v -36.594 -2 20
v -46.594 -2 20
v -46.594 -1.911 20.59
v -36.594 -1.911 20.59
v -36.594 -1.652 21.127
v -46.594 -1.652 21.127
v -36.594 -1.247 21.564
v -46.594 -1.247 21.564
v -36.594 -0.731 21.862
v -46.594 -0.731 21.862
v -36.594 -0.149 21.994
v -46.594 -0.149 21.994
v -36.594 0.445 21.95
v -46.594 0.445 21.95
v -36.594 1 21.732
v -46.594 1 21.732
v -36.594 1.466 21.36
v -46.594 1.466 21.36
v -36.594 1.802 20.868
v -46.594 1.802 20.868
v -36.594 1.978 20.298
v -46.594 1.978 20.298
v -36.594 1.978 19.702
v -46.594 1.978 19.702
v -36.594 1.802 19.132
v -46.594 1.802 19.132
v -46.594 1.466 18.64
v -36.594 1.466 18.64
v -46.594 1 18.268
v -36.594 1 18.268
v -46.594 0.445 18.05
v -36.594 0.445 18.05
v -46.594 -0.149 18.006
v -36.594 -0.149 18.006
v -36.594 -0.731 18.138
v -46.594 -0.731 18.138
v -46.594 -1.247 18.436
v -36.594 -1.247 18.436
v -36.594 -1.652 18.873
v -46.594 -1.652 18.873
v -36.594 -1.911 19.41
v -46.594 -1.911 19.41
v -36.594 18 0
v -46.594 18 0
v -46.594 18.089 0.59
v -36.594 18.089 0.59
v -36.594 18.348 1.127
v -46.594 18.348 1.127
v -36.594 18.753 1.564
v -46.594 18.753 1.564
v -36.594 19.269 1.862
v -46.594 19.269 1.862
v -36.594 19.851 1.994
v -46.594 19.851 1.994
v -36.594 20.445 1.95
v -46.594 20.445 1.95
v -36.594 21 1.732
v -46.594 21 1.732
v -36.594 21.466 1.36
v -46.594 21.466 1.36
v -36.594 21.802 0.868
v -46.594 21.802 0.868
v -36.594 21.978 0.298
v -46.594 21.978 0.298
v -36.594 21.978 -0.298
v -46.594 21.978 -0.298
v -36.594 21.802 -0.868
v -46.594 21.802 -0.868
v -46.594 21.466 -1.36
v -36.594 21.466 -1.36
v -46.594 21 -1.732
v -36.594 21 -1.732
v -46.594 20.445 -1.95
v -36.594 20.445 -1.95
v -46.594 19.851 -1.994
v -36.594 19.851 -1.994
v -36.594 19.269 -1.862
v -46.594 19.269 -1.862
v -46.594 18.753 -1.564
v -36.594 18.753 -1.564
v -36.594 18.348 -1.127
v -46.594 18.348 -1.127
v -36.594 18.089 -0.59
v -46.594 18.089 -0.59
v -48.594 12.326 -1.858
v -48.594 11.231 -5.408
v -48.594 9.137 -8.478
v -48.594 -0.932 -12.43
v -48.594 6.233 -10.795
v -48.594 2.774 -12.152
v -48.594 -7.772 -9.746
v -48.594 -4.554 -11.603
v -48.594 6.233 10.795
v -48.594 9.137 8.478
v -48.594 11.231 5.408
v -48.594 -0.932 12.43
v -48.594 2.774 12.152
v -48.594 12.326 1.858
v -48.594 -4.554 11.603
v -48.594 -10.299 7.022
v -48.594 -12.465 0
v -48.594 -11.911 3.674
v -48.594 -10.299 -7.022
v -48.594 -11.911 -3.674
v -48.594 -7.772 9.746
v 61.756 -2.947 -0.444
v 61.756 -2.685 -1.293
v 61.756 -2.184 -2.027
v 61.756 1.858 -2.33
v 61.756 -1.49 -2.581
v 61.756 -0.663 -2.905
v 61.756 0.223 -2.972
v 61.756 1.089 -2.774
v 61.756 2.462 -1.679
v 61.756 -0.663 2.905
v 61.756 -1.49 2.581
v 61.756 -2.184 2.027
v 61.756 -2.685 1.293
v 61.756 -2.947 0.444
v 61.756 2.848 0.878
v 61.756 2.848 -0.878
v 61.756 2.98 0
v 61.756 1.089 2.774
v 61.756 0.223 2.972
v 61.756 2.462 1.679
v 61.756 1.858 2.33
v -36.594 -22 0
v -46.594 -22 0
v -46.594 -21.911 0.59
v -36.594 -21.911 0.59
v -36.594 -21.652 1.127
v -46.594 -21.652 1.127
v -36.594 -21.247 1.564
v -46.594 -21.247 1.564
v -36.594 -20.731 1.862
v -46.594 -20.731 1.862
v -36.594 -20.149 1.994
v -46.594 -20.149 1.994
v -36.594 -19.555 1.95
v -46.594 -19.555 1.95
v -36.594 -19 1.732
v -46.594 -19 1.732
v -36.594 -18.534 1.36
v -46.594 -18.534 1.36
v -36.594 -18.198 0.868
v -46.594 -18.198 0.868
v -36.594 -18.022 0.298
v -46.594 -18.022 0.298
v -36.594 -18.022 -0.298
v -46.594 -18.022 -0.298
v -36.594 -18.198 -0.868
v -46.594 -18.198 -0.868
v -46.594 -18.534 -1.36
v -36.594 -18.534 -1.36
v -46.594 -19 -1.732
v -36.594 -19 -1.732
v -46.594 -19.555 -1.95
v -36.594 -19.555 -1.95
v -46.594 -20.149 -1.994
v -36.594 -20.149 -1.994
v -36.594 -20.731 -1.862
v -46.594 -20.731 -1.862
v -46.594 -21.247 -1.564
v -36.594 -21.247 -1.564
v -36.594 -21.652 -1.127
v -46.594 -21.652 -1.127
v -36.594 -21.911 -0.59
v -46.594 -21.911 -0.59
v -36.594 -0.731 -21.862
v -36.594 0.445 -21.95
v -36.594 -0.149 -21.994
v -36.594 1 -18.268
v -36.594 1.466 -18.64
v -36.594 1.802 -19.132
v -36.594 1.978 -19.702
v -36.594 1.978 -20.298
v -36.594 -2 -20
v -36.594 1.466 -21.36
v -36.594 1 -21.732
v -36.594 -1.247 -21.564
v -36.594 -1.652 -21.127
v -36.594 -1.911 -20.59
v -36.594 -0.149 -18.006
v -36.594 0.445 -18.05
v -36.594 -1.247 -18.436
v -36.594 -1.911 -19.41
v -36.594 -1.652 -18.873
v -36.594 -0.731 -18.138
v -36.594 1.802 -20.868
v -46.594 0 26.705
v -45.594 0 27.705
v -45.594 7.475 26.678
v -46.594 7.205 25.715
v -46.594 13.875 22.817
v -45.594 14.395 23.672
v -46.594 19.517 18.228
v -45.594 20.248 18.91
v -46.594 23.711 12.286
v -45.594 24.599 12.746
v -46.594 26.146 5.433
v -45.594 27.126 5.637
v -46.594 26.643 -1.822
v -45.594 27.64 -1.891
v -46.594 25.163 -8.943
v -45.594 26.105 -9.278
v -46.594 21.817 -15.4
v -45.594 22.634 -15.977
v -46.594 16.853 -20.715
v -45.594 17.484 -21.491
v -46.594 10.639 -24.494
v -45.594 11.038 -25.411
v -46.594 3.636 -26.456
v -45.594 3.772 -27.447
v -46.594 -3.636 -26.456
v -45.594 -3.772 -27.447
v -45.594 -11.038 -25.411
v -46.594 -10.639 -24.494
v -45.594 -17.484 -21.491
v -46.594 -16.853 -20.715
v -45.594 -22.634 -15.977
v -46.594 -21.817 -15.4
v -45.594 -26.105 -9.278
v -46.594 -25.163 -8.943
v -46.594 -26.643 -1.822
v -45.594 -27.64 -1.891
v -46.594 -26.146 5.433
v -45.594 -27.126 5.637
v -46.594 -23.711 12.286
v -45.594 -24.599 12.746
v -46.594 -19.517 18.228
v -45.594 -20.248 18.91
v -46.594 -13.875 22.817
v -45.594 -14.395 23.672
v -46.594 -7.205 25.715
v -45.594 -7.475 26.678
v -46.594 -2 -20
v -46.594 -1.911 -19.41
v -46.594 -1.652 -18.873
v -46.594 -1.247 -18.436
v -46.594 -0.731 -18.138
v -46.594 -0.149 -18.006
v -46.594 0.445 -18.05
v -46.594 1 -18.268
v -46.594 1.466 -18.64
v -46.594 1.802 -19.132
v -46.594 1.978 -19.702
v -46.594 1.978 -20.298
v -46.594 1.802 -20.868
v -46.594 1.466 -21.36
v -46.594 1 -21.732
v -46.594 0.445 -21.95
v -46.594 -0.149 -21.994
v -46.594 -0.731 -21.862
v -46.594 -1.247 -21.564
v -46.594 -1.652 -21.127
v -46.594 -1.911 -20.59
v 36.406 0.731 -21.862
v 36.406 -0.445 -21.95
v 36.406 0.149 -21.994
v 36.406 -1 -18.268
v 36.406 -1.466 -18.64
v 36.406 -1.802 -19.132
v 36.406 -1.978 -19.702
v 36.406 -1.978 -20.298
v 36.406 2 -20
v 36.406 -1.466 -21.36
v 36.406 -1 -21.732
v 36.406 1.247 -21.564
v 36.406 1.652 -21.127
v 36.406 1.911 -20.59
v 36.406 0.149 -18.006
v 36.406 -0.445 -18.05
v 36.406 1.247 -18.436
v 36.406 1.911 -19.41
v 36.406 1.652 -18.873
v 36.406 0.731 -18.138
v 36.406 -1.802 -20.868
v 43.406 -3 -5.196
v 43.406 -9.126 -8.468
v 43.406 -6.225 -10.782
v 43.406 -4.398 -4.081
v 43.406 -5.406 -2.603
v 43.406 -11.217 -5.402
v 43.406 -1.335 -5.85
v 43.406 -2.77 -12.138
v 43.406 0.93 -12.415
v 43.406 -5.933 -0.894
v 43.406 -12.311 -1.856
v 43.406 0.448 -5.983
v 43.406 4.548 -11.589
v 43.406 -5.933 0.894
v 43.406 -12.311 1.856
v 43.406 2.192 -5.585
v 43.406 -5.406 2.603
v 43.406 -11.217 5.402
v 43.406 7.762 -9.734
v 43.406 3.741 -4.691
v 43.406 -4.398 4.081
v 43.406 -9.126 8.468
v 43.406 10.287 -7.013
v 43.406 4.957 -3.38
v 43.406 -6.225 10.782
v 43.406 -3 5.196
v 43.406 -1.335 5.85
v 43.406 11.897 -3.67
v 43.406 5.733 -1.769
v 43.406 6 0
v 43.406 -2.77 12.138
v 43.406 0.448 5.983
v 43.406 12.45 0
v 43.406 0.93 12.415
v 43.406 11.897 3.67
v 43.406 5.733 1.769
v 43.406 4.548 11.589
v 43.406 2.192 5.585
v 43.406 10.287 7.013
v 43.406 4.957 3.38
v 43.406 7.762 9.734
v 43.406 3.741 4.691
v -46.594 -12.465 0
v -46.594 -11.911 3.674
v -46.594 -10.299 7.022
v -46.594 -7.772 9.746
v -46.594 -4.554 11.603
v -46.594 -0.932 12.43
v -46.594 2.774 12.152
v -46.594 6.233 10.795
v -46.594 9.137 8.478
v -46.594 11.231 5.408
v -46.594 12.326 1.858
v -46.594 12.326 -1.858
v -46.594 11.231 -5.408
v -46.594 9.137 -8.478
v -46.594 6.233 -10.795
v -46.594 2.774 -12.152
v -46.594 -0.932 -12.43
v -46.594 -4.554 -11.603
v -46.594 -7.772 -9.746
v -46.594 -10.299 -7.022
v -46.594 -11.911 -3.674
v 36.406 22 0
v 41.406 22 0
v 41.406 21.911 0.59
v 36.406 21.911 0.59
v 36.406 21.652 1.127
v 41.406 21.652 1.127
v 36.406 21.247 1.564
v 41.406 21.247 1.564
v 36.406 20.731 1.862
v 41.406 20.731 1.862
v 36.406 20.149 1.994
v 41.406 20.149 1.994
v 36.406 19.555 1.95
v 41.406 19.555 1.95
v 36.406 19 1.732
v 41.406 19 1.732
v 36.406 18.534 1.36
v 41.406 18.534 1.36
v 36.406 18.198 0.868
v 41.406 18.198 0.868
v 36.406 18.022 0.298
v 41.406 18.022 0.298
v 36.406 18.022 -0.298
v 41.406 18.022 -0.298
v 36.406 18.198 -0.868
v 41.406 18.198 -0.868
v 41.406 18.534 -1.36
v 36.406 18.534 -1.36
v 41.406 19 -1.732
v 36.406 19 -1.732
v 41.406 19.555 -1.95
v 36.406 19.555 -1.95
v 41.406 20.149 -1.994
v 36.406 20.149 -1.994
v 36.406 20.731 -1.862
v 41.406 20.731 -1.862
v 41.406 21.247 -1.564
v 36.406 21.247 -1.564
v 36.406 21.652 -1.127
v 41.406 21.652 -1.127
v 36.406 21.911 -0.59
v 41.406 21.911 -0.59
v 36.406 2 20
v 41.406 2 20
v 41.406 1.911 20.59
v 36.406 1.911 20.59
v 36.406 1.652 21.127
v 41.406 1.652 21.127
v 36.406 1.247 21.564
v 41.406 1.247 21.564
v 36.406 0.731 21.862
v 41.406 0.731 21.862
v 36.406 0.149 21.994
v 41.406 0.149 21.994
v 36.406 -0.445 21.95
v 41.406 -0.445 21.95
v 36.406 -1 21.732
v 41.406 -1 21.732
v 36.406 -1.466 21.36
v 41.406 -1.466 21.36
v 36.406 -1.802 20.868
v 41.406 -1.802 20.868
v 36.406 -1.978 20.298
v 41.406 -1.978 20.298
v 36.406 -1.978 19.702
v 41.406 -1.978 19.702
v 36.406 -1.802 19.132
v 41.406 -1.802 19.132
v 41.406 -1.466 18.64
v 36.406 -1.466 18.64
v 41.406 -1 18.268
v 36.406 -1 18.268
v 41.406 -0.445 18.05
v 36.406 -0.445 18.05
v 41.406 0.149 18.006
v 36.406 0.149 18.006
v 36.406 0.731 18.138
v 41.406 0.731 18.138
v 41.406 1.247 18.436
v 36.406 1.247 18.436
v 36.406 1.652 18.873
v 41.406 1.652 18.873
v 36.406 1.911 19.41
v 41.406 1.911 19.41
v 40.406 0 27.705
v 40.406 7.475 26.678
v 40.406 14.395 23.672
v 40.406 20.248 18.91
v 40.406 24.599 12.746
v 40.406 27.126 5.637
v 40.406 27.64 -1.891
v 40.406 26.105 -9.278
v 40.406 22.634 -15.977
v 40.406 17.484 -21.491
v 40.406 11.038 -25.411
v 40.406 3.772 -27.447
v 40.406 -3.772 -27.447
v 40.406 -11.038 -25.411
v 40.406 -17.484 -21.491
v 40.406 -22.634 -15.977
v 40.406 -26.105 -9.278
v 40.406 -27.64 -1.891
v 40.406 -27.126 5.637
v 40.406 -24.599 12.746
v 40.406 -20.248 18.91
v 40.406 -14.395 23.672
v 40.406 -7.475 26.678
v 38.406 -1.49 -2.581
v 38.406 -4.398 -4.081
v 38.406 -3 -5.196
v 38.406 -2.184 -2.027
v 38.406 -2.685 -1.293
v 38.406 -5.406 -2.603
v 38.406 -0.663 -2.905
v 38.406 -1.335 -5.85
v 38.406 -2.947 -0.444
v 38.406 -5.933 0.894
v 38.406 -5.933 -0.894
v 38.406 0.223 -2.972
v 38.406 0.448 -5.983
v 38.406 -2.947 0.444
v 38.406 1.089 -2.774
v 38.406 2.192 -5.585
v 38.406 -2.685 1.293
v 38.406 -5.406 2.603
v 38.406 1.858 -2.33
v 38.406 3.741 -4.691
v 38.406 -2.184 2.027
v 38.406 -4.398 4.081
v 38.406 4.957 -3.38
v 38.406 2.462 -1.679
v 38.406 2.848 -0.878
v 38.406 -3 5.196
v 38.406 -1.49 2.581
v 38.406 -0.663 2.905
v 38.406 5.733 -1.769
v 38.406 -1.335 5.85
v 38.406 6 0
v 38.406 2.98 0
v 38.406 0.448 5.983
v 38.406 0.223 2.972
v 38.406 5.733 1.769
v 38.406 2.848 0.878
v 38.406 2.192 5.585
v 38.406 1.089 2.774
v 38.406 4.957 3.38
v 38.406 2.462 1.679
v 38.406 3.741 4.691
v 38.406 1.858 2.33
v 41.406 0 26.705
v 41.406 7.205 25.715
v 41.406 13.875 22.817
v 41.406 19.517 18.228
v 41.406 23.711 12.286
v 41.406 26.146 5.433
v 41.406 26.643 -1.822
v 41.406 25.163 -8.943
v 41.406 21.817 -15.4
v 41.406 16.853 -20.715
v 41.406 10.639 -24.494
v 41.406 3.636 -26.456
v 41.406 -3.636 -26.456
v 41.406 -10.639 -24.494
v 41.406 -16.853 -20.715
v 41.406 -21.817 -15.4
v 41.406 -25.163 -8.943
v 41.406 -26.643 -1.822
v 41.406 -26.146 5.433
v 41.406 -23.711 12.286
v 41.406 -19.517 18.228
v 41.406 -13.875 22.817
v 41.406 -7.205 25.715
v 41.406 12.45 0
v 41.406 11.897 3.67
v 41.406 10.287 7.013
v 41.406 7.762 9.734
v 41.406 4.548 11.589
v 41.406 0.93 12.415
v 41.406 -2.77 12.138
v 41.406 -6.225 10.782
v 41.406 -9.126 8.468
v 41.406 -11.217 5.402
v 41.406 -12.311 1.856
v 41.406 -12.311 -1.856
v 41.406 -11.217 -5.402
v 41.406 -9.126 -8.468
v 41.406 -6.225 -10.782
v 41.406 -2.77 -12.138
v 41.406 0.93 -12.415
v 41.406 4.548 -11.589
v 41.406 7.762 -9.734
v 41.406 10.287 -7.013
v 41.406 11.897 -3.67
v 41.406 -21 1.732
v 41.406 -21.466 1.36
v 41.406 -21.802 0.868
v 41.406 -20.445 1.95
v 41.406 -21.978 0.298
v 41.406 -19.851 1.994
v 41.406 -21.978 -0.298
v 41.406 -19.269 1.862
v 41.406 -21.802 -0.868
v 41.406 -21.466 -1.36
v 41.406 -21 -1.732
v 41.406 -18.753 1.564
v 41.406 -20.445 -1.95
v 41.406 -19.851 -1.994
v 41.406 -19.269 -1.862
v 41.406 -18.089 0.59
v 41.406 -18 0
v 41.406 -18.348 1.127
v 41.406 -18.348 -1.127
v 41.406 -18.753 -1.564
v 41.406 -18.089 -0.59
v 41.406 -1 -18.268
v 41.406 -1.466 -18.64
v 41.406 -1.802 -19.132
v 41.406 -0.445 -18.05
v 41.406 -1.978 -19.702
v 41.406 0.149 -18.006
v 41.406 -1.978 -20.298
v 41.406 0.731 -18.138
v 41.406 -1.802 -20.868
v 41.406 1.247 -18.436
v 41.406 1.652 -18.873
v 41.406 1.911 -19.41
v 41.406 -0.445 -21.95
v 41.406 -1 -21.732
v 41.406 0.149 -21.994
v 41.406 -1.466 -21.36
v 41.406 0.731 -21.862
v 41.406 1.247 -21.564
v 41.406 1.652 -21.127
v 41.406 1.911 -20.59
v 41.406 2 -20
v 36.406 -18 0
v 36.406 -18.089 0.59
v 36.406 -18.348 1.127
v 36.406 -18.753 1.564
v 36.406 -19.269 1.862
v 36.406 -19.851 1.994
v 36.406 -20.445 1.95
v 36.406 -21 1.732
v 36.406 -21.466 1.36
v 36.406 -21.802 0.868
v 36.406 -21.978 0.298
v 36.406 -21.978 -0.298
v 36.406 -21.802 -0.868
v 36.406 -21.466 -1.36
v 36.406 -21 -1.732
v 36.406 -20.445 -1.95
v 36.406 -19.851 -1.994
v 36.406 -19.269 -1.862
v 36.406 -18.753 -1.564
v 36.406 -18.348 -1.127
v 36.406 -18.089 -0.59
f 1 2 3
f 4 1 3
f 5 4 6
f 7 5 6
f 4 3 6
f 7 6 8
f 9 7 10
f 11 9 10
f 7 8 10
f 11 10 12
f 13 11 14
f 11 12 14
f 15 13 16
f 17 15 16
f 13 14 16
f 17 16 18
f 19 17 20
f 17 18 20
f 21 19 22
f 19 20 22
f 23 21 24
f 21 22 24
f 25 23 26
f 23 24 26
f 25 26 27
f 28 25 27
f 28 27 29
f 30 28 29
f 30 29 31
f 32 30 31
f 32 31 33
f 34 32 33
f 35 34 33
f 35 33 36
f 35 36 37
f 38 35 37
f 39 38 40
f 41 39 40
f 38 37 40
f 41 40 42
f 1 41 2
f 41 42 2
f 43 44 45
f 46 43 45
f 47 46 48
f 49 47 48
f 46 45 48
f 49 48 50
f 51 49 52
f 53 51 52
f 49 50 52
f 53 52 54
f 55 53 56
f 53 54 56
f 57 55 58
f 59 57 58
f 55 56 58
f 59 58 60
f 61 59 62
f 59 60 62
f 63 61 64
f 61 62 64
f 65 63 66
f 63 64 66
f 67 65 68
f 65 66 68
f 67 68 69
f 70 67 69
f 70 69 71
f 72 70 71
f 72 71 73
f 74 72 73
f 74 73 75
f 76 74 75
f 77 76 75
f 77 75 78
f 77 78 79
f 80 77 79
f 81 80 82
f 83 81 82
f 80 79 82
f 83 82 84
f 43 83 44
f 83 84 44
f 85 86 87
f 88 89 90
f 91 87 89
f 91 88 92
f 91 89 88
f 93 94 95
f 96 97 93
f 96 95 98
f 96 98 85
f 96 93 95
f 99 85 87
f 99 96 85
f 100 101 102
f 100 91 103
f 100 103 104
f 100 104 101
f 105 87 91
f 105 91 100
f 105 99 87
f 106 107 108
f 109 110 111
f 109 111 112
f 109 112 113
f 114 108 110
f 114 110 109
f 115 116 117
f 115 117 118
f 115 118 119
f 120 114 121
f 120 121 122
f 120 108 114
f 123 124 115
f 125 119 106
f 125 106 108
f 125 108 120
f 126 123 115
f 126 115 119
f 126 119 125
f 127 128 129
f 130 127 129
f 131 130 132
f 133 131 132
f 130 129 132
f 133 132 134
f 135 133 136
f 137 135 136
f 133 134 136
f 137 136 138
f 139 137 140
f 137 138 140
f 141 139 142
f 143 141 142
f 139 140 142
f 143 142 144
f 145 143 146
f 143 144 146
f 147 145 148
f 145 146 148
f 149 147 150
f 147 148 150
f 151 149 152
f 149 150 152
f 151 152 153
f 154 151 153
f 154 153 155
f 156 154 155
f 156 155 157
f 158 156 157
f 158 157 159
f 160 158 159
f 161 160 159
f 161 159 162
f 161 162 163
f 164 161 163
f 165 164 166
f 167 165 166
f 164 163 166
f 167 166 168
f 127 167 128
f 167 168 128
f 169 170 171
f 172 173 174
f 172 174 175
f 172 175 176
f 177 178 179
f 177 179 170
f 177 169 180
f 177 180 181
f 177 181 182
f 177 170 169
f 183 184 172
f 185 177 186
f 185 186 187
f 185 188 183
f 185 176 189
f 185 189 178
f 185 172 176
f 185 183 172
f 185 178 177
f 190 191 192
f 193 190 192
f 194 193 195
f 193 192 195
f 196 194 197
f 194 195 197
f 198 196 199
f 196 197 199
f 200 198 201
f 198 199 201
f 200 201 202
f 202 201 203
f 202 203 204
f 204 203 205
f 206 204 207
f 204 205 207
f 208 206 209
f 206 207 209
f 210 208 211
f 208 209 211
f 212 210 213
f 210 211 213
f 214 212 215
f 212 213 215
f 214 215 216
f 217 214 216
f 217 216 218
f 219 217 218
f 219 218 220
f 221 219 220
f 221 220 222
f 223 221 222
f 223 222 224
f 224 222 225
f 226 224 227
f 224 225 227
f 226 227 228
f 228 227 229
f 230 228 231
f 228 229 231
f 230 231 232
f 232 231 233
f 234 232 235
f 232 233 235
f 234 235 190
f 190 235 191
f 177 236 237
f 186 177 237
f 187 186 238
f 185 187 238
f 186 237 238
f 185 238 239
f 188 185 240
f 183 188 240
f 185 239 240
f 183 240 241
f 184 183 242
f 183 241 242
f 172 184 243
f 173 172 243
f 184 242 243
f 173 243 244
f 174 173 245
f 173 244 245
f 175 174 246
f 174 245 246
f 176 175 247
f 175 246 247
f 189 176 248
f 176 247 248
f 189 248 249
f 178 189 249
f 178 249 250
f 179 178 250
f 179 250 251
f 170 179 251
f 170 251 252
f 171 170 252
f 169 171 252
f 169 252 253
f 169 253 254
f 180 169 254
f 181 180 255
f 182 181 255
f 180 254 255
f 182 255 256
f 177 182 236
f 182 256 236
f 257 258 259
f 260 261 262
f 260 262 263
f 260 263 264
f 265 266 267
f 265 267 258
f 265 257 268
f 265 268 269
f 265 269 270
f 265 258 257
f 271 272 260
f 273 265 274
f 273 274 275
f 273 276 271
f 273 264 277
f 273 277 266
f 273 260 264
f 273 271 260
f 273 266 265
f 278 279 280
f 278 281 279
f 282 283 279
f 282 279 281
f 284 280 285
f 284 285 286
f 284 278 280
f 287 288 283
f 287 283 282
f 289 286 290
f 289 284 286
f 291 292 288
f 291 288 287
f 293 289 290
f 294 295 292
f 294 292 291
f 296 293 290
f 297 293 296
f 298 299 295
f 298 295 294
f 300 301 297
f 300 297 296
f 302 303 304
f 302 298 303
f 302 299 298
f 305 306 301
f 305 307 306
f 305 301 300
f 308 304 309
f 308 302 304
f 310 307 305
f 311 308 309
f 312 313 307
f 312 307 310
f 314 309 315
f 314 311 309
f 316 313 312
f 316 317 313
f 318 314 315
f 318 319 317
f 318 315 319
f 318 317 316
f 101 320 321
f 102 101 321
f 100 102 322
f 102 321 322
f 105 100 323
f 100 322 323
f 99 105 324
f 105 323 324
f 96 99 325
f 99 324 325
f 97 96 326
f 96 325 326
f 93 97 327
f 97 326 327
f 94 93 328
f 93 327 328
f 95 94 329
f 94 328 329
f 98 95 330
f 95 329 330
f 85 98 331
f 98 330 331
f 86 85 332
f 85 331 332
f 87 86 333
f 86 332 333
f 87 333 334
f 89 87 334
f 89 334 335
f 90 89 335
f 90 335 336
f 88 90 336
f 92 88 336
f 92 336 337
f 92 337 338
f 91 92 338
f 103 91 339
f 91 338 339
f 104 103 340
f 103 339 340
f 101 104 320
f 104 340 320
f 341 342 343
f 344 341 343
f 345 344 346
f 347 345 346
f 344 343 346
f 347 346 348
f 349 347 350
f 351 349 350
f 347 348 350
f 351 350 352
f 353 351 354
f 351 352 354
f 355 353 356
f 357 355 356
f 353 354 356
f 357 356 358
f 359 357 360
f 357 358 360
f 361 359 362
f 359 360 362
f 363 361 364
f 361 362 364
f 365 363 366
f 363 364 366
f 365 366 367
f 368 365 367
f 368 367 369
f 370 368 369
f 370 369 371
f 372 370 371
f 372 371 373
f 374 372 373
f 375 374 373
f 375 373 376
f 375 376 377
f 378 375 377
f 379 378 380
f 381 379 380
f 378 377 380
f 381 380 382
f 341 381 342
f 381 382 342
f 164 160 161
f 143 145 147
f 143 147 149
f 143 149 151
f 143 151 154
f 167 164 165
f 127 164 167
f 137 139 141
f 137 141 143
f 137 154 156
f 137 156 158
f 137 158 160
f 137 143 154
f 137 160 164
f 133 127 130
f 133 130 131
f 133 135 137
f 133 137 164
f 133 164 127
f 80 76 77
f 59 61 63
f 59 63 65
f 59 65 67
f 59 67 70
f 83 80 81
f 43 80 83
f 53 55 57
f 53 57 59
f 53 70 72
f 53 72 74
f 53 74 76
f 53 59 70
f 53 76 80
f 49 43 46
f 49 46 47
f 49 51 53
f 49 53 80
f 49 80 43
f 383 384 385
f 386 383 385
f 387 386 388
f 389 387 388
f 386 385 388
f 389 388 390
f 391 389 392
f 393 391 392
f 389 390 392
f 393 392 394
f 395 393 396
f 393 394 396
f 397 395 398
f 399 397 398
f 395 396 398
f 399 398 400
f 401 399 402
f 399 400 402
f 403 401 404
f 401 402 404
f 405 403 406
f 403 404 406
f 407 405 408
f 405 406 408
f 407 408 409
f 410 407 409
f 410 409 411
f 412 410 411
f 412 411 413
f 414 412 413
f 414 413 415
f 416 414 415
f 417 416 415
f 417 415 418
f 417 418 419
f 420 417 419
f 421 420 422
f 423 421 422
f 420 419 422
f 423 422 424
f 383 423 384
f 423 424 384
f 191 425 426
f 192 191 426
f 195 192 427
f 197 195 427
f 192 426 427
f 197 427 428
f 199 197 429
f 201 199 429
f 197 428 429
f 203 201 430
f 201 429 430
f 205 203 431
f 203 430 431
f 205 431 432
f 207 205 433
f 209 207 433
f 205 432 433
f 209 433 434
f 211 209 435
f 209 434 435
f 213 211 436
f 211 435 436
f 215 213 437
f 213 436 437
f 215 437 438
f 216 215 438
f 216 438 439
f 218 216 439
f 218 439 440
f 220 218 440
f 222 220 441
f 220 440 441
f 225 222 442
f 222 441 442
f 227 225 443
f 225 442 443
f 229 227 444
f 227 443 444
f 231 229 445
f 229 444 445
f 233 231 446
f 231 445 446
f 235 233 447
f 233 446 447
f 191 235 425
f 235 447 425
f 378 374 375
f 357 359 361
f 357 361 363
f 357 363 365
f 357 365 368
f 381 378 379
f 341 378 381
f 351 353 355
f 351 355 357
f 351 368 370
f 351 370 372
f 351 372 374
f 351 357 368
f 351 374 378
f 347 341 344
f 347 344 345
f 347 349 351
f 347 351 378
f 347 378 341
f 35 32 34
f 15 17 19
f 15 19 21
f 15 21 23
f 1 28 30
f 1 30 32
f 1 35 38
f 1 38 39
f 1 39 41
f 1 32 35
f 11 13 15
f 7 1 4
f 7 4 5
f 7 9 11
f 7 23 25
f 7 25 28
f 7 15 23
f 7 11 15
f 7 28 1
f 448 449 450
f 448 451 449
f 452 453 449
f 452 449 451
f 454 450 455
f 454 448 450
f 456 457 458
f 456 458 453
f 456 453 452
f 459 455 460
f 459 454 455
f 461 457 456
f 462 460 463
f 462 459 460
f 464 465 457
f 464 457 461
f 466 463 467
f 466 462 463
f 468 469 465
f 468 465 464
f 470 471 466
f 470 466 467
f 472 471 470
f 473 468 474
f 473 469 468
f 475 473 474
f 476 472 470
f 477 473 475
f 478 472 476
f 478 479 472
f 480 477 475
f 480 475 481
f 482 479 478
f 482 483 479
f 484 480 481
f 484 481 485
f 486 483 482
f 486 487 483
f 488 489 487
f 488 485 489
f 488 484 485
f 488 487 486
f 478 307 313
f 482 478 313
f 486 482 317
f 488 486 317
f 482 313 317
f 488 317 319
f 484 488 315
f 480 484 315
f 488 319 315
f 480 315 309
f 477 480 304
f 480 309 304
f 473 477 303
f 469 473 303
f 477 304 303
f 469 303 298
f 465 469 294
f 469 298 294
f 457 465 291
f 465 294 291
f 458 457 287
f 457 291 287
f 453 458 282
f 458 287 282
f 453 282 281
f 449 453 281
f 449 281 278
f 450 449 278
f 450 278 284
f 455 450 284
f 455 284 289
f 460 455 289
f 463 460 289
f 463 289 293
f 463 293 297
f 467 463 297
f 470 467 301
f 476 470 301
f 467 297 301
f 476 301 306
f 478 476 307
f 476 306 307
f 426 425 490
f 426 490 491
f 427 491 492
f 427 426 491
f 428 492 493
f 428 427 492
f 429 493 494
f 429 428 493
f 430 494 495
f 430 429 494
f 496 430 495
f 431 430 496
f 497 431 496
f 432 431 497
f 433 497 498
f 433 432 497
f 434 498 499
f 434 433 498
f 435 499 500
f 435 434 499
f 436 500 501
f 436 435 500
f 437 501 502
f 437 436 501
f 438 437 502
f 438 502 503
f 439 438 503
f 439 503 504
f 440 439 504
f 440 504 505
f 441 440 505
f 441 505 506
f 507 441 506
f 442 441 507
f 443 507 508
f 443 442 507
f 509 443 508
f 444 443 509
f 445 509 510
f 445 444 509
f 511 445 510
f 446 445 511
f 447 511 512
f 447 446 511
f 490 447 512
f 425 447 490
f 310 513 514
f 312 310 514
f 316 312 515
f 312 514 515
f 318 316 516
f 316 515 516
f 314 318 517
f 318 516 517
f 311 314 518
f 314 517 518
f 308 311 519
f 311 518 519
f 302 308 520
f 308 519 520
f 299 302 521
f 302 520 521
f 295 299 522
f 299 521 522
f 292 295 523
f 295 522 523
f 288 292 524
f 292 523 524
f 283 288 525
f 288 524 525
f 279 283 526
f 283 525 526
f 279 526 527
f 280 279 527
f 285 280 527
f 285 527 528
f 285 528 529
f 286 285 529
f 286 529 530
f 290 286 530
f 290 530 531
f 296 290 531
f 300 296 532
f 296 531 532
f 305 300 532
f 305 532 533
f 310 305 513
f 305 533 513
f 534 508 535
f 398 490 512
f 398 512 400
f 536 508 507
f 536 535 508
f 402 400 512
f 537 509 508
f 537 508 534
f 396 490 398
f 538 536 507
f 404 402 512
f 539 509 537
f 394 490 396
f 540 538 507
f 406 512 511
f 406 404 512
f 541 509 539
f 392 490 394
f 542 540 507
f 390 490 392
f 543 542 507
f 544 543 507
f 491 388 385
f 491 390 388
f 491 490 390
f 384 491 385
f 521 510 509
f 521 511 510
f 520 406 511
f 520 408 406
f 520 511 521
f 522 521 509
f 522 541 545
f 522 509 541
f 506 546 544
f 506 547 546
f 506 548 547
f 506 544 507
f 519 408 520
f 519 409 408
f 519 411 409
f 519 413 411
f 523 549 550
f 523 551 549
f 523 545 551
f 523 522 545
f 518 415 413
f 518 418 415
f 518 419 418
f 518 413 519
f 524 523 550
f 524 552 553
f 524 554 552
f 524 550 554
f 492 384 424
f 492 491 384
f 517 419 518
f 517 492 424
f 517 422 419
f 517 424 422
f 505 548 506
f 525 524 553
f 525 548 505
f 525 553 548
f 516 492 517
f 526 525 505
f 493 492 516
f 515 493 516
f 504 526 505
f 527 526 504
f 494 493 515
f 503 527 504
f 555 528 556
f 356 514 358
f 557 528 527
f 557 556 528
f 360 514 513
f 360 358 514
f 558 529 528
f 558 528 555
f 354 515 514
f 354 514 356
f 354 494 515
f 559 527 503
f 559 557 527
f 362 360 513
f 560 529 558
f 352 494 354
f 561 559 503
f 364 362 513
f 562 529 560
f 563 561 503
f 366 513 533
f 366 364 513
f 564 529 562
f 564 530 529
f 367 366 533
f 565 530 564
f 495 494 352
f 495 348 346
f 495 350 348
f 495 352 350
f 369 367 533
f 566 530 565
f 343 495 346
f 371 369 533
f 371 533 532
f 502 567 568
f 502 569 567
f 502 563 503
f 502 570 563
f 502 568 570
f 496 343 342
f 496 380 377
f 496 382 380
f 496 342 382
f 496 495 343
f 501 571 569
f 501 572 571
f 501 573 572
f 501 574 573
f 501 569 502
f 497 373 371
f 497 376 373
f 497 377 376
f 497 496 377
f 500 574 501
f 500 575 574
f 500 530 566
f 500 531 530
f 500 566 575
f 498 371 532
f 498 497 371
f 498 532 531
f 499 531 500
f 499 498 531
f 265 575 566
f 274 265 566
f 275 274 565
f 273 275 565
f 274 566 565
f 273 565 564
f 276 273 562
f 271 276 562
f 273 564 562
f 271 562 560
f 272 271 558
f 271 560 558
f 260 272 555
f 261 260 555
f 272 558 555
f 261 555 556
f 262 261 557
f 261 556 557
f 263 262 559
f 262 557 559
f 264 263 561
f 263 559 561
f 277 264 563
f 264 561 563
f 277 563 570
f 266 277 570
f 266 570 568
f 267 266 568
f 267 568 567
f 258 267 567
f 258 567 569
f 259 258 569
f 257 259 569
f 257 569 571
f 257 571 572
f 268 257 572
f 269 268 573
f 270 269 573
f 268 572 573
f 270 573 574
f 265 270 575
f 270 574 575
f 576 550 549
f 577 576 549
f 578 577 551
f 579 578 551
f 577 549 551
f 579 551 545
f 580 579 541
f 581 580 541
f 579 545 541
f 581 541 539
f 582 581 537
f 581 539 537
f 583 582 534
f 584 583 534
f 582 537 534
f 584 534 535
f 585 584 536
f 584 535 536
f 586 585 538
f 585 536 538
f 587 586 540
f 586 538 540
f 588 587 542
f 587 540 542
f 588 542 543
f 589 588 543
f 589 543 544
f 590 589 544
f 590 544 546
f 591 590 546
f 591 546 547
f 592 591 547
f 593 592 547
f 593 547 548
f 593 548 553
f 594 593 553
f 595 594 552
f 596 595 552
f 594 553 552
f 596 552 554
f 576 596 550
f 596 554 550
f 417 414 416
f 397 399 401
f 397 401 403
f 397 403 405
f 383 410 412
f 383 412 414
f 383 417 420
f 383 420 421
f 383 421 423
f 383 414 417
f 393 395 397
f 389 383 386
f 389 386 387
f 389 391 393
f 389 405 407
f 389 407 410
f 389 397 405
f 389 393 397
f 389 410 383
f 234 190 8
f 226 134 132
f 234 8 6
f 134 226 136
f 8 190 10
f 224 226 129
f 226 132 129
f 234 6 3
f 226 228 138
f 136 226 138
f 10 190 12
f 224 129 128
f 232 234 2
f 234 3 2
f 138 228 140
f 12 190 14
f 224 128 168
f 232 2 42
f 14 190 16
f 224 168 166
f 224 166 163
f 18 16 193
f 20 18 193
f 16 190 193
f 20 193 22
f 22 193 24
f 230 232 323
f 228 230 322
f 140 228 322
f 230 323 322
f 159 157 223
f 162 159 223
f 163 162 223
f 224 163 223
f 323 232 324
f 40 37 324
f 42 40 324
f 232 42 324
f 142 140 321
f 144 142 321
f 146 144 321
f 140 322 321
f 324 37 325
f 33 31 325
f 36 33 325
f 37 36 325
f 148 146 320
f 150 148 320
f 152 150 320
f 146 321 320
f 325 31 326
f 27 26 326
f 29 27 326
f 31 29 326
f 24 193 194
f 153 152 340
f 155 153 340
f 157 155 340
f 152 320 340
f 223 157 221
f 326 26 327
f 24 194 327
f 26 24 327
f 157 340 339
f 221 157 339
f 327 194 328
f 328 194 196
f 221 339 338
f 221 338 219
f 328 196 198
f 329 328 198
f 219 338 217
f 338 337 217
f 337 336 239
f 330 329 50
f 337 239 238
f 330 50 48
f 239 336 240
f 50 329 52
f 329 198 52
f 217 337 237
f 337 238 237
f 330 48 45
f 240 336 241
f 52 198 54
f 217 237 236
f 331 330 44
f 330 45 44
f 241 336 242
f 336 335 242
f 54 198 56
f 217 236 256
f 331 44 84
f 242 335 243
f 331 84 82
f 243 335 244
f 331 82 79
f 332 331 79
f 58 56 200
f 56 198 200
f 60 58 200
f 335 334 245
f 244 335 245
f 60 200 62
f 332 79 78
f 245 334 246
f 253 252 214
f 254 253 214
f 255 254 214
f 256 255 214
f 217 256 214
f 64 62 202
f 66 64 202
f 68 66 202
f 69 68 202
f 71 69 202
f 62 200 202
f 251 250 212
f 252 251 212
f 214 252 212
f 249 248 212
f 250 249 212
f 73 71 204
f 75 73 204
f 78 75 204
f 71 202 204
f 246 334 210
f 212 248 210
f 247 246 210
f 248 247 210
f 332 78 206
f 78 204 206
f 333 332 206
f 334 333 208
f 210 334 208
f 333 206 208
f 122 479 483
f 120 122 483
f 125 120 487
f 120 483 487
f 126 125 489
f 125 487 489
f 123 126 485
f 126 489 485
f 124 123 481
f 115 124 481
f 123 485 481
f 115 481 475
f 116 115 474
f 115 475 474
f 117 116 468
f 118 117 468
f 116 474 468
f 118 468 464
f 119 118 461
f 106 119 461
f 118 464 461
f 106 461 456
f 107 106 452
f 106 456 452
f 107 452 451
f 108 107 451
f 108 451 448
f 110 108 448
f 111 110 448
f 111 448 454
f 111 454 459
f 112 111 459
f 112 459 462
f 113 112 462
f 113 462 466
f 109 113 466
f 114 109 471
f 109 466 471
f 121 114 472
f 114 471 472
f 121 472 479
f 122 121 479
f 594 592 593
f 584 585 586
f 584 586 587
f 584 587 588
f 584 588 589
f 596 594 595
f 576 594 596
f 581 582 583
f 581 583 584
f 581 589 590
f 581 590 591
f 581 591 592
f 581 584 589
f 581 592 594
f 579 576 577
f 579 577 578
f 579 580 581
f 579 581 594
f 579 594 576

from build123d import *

# Parameters (mm, degrees)
F0_W      = 88
F0_H      = 27.705
F2_SIZE   = 1
F3_R      = 12.45
F4_DEPTH  = 2
F5_R      = 12.465
F6_DEPTH  = 2
F7_R      = 2
F8_DEPTH  = 10
F9_R      = 6
F10_DEPTH = 5
F11_R     = 2.98
F12_DEPTH = 23.35
F13_R     = 2
F14_DEPTH = 5


with BuildPart() as f1:
    # F0 (on Front) → F1 (revolve)
    with BuildSketch(Plane.XZ):
        with Locations((-2.593532, 13.8525)):
            Rectangle(F0_W, F0_H)
    revolve(axis=Axis((-2.593532, 0, 0), (-1, 0, 0)))

    # F2
    f2_edges = [f1.edges().sort_by_distance(p)[0] for p in [
        (-46.593532, 0, -27.705),
        (41.406468, 0, -27.705),
    ]]
    chamfer(f2_edges, length=F2_SIZE)

    # F3 (on face) → F4 (join)
    with BuildSketch(Plane.YZ.offset(41.406468)):
        Circle(F3_R)
    extrude(amount=F4_DEPTH)

    # F5 (on face) → F6 (join)
    with BuildSketch(Plane(origin=(-46.593532, 0, 0), x_dir=(0, -1, 0), z_dir=(-1, 0, 0))):
        Circle(F5_R)
    extrude(amount=F6_DEPTH)

    # F7 (on face) → F8 (cut)
    with BuildSketch(Plane(origin=(-46.593532, 0, 0), x_dir=(0, -1, 0), z_dir=(-1, 0, 0))):
        with Locations((0, 20)):
            Circle(F7_R)
        with Locations((-20, 0)):
            Circle(F7_R)
        with Locations((0, -20)):
            Circle(F7_R)
        with Locations((20, 0)):
            Circle(F7_R)
    extrude(amount=-F8_DEPTH, mode=Mode.SUBTRACT)

    # F9 (on face) → F10 (cut)
    with BuildSketch(Plane.YZ.offset(43.406468)):
        Circle(F9_R)
    extrude(amount=-F10_DEPTH, mode=Mode.SUBTRACT)

    # F11 (on face) → F12 (join)
    with BuildSketch(Plane.YZ.offset(38.406468)):
        Circle(F11_R)
    extrude(amount=F12_DEPTH)

    # F13 (on face) → F14 (cut)
    with BuildSketch(Plane.YZ.offset(41.406468)):
        with Locations((0, 20)):
            Circle(F13_R)
        with Locations((20, 0)):
            Circle(F13_R)
        with Locations((0, -20)):
            Circle(F13_R)
        with Locations((-20, 0)):
            Circle(F13_R)
    extrude(amount=-F14_DEPTH, mode=Mode.SUBTRACT)


solid = f1.part
